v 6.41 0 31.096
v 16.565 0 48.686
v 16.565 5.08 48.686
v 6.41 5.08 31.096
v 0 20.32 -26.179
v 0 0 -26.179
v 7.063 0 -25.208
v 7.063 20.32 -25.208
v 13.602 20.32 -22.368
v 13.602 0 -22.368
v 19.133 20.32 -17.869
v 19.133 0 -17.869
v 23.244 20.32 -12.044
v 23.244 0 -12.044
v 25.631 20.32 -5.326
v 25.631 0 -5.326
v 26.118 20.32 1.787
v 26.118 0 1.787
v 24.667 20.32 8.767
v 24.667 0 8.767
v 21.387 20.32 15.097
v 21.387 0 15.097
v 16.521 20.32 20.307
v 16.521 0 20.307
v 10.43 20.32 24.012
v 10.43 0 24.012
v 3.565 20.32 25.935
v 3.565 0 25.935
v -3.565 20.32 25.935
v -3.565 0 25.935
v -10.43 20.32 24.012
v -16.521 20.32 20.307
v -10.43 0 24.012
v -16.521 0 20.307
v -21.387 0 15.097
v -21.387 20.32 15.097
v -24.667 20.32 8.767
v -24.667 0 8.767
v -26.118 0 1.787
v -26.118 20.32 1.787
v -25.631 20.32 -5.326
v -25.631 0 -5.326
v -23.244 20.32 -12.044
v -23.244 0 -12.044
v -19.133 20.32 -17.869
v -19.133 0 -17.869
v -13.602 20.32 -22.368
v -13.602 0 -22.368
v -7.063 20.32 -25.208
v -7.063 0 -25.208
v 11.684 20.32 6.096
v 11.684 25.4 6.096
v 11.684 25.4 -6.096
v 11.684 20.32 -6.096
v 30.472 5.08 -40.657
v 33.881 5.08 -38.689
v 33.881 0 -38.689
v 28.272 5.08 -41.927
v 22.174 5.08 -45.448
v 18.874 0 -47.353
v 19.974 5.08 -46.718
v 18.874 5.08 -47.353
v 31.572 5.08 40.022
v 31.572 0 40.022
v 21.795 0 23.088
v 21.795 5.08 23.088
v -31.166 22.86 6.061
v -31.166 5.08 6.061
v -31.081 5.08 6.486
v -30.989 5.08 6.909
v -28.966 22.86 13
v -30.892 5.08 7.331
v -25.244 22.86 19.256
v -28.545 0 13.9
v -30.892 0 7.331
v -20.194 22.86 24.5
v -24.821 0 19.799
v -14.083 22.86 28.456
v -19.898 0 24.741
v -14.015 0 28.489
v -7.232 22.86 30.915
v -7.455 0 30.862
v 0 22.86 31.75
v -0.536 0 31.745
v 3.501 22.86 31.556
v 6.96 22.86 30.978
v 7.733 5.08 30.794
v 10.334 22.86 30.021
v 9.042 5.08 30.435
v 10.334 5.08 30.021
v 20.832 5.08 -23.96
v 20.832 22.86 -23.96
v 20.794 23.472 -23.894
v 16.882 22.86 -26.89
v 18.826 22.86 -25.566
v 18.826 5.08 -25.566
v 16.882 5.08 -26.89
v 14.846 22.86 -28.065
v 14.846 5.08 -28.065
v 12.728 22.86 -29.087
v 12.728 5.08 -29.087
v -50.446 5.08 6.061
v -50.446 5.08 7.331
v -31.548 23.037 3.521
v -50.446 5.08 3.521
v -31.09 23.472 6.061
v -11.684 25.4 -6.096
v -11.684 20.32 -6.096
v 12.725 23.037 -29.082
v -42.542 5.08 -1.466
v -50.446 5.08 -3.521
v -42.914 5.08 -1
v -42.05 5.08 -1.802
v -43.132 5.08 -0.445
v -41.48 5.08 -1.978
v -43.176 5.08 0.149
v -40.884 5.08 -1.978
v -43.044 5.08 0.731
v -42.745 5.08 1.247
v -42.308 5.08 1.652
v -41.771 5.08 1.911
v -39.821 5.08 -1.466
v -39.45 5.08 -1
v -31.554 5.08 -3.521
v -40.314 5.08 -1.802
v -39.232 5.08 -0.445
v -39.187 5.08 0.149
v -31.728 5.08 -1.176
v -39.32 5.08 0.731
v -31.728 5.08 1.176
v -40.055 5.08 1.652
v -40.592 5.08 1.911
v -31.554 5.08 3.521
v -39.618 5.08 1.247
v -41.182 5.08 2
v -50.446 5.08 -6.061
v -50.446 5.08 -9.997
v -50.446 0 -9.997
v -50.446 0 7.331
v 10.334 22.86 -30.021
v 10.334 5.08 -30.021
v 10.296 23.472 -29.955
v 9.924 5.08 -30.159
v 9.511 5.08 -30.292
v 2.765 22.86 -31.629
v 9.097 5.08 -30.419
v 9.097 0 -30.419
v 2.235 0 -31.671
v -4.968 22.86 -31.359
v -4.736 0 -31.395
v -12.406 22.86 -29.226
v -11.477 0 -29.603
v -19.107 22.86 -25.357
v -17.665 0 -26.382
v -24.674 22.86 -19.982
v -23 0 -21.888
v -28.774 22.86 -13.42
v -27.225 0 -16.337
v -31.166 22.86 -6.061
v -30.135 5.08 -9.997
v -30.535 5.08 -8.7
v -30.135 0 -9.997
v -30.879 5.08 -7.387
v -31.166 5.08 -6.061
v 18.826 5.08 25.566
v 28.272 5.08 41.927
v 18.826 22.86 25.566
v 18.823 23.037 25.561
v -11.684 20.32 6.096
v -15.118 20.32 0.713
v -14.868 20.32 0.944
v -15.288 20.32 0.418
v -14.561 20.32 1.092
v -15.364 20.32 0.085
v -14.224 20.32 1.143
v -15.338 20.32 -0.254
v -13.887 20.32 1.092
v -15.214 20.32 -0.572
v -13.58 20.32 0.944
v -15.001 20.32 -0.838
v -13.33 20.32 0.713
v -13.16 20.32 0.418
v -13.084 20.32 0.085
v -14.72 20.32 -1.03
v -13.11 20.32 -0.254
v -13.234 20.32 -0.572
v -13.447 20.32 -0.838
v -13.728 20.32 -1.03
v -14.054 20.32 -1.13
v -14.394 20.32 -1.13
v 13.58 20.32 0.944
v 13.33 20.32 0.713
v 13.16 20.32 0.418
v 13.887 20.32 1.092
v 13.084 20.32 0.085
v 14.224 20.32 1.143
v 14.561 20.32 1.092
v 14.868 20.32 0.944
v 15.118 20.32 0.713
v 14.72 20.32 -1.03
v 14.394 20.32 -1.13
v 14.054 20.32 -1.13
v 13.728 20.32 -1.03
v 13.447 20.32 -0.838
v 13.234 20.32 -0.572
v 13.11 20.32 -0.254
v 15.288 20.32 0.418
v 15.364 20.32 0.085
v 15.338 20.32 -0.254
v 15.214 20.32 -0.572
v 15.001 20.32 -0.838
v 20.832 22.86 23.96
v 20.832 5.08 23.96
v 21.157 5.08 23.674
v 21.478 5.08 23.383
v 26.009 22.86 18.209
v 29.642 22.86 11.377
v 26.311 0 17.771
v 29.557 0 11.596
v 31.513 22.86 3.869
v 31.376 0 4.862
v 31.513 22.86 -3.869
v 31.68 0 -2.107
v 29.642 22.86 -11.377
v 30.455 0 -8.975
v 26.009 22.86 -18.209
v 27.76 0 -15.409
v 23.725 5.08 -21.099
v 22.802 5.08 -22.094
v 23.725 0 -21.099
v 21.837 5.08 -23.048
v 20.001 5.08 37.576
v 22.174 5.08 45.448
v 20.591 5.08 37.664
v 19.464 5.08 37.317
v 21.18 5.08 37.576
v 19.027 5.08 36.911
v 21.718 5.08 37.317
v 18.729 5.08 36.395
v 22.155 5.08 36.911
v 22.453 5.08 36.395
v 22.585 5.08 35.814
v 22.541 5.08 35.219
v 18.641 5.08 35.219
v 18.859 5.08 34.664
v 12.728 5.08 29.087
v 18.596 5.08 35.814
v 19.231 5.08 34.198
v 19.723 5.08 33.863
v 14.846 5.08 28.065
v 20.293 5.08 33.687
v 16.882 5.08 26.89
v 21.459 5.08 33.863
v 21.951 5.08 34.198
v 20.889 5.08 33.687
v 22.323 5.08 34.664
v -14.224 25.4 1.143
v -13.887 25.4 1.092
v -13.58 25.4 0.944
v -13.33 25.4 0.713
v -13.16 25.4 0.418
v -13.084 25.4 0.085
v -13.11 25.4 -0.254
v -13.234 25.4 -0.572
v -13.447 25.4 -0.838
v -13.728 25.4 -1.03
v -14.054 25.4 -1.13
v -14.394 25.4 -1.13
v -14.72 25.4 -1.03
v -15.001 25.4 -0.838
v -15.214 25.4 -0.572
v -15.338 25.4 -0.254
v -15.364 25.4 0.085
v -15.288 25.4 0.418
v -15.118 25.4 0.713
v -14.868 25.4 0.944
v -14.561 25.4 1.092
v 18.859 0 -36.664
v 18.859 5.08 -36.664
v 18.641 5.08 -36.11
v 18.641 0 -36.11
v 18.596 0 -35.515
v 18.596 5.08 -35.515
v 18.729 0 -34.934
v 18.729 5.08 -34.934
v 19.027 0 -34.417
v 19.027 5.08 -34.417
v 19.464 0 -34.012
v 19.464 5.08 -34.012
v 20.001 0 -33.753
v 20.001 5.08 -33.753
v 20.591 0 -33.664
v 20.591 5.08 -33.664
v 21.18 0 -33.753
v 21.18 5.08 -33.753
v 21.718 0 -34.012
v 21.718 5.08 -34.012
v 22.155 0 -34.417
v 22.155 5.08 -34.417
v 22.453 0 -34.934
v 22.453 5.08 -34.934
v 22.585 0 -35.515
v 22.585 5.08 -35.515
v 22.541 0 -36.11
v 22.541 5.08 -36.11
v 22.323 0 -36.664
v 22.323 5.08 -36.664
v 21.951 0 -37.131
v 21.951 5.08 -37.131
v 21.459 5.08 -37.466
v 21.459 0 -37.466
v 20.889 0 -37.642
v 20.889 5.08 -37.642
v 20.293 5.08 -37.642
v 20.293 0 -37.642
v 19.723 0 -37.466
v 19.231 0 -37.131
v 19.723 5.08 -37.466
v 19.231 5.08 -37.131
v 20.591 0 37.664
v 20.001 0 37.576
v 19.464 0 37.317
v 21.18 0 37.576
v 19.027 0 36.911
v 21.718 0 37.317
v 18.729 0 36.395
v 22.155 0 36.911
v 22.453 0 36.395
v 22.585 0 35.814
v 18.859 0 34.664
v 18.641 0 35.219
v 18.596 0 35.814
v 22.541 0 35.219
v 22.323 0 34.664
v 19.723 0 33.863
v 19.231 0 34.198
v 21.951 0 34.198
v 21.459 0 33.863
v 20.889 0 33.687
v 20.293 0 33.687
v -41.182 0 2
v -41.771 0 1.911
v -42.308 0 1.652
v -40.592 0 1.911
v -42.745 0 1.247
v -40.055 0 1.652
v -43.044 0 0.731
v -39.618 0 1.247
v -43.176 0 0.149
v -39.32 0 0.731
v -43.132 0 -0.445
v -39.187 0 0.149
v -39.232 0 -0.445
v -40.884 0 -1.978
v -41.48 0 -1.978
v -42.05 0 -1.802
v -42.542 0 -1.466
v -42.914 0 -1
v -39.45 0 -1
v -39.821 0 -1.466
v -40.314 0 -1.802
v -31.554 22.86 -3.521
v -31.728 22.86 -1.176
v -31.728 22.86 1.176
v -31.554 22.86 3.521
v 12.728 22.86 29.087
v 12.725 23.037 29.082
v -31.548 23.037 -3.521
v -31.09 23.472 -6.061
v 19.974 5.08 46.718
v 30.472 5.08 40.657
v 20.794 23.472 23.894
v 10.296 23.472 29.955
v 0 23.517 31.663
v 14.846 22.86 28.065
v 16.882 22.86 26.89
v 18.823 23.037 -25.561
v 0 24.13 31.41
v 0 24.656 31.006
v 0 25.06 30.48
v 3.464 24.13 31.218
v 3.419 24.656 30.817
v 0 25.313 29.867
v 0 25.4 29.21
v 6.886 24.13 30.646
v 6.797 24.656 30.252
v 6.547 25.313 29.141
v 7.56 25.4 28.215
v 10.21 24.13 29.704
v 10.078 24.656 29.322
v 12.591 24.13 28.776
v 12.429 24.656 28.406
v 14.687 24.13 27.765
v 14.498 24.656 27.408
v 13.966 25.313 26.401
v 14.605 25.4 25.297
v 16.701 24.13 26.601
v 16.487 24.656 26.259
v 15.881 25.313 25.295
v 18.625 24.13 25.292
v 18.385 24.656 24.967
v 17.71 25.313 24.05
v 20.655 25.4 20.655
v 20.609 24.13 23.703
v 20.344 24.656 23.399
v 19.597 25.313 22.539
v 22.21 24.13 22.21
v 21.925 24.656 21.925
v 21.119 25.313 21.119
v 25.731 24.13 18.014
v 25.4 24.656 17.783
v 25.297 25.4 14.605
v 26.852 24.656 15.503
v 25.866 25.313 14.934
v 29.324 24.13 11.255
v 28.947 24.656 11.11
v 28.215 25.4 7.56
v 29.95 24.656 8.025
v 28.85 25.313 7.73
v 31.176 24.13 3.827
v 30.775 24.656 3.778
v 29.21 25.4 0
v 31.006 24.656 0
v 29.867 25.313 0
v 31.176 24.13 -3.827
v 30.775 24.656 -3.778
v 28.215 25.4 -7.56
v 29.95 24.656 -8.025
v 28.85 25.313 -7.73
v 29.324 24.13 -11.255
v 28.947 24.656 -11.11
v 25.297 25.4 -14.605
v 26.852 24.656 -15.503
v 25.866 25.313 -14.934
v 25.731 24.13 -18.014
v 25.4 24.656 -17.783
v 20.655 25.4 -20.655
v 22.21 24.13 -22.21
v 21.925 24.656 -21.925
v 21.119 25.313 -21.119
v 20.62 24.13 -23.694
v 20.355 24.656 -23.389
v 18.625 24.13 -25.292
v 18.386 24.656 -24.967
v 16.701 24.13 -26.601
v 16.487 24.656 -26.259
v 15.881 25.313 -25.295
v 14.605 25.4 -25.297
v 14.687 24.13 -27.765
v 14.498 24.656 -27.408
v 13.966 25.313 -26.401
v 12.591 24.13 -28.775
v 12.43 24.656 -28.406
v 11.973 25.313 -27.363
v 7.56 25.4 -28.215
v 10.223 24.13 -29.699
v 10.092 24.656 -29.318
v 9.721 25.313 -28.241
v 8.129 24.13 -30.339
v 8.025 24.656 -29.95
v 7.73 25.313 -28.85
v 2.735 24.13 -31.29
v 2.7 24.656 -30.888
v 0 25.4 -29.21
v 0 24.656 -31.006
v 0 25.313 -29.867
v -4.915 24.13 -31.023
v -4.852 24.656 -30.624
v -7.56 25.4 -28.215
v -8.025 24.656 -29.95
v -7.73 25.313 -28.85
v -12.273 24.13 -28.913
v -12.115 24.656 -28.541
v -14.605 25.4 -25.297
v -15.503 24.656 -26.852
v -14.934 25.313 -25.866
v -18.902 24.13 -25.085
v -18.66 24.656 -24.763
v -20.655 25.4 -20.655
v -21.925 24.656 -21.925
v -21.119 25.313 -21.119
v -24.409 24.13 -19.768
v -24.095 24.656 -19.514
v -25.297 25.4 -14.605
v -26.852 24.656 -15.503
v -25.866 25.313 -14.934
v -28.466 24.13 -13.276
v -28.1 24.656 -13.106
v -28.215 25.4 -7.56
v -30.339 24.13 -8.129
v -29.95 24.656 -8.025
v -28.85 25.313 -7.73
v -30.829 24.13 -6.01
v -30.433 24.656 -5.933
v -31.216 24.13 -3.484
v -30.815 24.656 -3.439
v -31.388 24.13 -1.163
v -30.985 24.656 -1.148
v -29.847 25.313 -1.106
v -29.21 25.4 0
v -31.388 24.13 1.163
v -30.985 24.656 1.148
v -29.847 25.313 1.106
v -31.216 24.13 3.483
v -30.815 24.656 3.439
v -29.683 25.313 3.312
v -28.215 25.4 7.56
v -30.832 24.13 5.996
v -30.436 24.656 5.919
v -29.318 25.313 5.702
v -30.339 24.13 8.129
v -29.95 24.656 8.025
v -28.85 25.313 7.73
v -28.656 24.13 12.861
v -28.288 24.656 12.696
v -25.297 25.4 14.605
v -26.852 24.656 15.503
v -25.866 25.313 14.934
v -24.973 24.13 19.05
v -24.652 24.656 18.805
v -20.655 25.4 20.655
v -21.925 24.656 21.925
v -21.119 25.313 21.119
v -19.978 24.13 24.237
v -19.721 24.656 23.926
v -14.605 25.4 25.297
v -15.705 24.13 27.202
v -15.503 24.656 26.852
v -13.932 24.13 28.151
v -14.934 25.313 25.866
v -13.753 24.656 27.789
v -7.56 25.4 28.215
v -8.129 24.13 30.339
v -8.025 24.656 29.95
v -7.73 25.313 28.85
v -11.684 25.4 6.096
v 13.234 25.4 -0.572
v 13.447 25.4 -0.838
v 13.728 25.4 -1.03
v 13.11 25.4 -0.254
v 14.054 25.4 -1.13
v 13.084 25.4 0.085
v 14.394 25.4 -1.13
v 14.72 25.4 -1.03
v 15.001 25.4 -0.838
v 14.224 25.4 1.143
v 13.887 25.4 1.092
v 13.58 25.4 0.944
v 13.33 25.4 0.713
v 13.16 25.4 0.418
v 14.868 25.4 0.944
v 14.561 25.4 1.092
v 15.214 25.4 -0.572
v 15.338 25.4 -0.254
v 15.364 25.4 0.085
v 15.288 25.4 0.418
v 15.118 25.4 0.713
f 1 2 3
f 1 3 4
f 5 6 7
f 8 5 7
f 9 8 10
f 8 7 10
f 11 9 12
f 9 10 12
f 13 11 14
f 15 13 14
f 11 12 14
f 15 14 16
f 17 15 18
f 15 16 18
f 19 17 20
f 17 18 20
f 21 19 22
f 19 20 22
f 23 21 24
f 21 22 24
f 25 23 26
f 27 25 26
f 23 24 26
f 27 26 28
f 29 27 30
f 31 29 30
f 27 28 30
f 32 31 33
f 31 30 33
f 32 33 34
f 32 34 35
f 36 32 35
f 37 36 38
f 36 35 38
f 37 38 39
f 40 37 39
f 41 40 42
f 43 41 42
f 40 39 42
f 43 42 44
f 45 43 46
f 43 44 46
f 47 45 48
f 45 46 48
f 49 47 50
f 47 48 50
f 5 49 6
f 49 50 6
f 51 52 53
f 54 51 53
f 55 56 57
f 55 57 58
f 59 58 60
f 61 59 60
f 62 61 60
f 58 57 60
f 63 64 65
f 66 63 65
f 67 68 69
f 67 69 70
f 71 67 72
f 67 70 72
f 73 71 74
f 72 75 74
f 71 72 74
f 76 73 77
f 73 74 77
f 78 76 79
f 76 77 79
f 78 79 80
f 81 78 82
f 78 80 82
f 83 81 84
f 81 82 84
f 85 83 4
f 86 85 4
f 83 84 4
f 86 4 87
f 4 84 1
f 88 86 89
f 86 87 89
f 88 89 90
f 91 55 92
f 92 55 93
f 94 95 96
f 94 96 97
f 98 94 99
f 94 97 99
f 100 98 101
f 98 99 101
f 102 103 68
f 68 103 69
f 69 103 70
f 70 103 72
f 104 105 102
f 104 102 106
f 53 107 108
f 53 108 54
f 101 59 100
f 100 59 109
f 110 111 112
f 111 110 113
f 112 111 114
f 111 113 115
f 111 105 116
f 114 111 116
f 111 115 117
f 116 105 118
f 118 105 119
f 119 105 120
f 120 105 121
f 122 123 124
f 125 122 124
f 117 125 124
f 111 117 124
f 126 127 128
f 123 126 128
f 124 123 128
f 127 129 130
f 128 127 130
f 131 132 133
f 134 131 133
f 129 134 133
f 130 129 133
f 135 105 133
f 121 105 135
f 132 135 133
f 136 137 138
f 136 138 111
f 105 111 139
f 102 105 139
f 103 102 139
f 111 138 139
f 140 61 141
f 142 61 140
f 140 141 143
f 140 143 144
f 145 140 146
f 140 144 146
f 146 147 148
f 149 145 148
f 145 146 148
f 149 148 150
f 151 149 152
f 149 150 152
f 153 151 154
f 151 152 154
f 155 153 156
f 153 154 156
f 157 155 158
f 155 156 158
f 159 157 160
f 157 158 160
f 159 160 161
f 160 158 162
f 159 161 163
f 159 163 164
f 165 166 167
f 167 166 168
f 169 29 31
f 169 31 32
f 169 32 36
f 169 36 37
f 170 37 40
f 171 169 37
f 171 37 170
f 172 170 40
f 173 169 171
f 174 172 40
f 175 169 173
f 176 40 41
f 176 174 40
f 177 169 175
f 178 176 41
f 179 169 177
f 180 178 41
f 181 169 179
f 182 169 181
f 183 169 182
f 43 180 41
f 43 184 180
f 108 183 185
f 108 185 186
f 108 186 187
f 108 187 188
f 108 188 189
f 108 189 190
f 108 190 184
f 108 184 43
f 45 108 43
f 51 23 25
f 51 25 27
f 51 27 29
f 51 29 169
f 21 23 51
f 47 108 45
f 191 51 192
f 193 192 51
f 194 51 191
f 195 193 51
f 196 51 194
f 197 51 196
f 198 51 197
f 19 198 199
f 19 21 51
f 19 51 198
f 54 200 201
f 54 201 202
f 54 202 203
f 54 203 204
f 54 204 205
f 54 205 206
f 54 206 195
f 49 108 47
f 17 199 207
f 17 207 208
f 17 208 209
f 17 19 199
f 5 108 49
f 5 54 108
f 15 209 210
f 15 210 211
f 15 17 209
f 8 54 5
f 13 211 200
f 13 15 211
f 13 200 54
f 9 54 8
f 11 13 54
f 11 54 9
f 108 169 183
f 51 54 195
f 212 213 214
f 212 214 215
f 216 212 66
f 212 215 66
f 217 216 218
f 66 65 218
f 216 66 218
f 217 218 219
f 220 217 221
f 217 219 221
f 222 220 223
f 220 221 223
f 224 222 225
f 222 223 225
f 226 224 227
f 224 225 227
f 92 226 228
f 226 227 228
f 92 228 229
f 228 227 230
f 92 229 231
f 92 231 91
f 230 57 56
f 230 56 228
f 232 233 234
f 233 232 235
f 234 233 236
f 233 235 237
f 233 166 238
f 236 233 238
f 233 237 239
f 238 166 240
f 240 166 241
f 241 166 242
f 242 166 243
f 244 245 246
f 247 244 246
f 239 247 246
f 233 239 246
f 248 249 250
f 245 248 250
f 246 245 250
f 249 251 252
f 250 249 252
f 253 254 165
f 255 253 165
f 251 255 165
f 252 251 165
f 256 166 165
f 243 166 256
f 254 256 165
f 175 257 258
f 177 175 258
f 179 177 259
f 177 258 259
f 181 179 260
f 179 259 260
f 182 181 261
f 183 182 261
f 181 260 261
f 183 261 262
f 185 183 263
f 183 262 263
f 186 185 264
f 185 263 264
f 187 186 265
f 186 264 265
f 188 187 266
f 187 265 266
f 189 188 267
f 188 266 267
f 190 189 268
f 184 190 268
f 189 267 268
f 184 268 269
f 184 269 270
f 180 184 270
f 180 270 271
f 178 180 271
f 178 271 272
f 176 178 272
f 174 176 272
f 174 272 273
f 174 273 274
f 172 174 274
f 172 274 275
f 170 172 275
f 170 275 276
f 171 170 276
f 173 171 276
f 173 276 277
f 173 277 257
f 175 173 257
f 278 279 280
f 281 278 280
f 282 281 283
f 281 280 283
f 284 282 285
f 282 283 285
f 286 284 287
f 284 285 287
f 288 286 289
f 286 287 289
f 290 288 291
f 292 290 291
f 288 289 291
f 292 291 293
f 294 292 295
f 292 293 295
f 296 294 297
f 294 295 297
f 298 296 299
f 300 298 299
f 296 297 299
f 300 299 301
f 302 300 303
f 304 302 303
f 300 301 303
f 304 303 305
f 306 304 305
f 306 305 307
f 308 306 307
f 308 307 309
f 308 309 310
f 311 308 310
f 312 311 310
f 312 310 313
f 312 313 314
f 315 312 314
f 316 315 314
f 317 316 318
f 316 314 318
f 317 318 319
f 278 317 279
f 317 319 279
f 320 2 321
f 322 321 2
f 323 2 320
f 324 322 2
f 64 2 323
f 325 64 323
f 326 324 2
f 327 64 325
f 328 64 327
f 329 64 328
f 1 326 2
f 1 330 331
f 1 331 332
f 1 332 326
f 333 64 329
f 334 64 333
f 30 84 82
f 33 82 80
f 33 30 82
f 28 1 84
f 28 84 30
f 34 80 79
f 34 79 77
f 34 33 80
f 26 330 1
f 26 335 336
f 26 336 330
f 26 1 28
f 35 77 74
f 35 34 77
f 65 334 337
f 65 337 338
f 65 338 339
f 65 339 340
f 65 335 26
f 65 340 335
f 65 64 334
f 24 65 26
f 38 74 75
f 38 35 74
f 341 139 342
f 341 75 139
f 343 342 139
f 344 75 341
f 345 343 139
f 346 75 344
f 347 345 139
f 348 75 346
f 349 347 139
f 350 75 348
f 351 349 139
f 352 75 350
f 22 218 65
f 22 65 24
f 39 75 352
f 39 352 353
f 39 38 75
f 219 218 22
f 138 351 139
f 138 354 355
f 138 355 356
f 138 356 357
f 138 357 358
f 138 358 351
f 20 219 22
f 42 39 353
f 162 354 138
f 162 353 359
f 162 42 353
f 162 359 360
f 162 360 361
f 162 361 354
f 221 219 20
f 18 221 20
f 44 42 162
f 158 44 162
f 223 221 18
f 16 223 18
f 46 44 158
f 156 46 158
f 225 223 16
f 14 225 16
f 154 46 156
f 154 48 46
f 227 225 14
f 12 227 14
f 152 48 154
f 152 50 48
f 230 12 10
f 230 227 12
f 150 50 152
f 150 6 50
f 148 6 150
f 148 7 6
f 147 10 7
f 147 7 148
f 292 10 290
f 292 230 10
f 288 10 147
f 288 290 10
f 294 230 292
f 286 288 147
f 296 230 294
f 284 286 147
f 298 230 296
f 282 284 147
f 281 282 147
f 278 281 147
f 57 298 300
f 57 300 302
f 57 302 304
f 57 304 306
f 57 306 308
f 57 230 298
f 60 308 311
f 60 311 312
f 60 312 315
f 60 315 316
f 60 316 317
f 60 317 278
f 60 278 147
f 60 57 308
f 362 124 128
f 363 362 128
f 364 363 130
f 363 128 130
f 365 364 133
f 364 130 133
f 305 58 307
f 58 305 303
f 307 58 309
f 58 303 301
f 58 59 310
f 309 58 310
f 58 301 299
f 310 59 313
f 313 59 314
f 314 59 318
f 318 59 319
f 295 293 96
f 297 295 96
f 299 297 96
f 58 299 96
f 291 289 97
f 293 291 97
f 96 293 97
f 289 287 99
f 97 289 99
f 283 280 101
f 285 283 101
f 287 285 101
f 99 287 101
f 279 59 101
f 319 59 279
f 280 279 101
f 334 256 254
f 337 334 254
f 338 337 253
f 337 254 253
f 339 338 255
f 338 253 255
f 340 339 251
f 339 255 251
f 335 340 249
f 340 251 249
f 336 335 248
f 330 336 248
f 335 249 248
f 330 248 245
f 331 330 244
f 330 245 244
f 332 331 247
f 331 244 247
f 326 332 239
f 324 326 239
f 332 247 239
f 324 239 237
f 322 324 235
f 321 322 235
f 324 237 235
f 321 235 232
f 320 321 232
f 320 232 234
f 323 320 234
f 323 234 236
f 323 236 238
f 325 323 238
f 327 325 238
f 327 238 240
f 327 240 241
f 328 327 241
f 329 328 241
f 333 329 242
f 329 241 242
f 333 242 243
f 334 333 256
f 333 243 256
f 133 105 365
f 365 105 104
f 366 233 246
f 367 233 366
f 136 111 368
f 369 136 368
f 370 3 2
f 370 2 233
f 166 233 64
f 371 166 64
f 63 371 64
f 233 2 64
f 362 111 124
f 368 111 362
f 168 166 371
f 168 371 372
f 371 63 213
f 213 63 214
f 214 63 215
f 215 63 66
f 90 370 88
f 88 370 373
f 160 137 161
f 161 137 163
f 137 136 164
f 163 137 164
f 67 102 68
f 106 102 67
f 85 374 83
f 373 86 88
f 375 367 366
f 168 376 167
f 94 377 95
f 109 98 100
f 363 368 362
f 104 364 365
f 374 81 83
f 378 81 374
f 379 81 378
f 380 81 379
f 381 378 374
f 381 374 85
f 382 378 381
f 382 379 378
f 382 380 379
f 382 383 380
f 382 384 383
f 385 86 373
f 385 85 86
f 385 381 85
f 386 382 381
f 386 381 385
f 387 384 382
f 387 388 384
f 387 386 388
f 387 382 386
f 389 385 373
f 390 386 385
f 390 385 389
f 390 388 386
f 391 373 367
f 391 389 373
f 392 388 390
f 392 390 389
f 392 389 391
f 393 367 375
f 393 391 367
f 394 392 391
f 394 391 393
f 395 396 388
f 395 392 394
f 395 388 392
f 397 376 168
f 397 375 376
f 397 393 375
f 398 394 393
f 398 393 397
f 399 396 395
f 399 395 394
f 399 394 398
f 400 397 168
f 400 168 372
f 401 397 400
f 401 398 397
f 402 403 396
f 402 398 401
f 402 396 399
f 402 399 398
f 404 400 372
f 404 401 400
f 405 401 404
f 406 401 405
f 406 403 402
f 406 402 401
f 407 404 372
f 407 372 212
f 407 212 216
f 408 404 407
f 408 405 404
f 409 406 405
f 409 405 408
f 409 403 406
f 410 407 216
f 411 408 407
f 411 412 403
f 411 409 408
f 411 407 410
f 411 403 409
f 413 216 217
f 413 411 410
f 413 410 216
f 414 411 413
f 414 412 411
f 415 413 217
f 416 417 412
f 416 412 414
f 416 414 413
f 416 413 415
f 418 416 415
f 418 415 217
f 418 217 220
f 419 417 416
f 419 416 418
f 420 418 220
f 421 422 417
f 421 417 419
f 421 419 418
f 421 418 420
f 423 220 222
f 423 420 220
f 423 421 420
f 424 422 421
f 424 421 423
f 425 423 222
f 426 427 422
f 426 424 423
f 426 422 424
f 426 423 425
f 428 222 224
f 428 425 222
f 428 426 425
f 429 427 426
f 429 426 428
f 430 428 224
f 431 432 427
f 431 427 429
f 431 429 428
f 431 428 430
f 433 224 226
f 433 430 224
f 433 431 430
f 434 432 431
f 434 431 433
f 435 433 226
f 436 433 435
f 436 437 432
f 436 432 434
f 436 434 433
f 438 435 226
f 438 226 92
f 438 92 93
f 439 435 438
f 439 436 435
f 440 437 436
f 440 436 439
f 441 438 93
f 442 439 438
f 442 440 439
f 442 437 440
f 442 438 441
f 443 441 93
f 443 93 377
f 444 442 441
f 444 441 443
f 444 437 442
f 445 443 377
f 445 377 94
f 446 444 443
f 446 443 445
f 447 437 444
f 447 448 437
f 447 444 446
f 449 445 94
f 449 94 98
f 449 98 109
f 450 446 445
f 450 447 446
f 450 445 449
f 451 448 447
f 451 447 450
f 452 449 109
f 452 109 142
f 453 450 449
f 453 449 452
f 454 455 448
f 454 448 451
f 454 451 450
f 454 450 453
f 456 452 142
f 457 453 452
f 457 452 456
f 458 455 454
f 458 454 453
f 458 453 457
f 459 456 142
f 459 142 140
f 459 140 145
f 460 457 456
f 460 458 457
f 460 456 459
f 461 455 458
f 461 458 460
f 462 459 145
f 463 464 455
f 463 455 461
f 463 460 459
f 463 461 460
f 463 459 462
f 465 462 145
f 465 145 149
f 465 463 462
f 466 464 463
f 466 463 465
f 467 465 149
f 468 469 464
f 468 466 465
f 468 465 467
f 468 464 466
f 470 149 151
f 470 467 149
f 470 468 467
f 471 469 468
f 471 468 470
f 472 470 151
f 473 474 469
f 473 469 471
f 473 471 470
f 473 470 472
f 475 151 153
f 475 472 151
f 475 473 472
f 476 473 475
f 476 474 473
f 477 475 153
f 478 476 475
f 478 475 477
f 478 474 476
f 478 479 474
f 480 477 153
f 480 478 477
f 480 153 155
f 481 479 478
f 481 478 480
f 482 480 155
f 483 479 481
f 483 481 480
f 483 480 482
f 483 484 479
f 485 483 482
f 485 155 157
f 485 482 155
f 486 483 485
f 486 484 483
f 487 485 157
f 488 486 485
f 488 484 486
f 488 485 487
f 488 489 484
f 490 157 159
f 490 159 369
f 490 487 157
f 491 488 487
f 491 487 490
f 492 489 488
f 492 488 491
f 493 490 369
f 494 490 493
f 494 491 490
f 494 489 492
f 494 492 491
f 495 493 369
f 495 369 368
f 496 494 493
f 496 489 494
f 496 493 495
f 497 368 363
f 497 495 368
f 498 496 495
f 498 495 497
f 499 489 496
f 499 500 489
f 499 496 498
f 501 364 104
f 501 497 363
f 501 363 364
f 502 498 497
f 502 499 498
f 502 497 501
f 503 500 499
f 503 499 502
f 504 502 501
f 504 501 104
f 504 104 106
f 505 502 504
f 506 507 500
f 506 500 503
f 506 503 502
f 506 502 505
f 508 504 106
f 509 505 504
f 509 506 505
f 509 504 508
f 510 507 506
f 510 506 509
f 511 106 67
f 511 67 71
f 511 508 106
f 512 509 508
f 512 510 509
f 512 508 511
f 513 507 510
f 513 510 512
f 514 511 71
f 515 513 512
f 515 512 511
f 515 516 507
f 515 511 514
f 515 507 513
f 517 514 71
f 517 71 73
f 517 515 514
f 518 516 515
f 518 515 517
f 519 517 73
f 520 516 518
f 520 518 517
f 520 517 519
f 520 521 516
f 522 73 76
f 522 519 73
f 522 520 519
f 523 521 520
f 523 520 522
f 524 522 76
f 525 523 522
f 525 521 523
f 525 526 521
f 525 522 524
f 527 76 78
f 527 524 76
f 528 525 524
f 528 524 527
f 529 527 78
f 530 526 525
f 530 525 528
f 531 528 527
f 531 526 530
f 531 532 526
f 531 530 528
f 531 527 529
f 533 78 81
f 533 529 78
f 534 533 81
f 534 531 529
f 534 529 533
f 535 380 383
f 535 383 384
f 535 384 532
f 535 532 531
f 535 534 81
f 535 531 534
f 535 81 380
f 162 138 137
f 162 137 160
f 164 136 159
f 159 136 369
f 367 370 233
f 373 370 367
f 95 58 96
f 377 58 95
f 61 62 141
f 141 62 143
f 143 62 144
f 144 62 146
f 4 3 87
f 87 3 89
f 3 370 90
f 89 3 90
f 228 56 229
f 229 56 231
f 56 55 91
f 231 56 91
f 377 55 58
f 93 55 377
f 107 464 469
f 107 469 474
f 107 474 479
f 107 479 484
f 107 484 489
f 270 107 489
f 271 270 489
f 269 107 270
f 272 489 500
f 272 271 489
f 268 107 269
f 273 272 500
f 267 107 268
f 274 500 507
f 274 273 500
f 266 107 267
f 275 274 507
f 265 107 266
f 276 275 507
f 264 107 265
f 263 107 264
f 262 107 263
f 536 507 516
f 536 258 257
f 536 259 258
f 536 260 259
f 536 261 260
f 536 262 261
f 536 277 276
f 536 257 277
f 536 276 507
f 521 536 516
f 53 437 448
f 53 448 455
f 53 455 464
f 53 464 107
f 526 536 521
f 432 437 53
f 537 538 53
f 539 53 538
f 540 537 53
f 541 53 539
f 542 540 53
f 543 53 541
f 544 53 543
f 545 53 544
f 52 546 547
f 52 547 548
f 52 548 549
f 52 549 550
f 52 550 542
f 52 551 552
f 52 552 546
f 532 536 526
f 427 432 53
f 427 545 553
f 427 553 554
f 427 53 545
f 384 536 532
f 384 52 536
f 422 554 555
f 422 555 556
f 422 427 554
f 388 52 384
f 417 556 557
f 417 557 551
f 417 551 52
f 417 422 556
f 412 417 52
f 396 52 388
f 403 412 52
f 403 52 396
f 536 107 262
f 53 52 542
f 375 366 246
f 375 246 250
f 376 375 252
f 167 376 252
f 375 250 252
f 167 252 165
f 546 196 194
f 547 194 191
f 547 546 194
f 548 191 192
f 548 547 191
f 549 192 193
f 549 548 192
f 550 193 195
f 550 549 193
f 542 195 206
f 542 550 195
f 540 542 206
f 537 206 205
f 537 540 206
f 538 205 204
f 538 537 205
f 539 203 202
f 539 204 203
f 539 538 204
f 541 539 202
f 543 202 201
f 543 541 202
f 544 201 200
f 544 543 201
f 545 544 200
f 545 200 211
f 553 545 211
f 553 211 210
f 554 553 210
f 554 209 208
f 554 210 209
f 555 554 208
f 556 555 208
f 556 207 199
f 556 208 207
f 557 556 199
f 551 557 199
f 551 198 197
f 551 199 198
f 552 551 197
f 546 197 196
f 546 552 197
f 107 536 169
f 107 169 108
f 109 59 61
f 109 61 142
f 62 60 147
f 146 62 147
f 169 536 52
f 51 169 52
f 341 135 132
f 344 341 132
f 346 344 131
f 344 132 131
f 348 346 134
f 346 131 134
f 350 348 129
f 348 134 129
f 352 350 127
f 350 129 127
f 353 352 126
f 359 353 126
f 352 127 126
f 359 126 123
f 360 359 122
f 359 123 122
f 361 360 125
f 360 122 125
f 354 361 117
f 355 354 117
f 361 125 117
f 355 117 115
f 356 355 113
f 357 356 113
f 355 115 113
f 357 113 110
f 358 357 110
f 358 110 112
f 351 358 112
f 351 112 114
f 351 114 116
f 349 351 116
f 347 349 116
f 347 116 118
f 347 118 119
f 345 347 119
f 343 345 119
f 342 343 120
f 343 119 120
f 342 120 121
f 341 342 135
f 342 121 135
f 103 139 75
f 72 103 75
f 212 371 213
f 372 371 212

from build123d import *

# Parameters (mm, degrees)
SKETCH1_R                   = 31.75
BOSS_EXTRUDE1_DEPTH         = 25.4
FILLET1_R                   = 2.54
SKETCH2_R                   = 26.178994306
CUT_EXTRUDE1_DEPTH          = 20.32
SKETCH3_W                   = 23.368
SKETCH3_H                   = 12.192
CUT_EXTRUDE2_DEPTH          = 20.32
SKETCH4_R                   = 1.143
CUT_EXTRUDE3_DEPTH          = 20.32
SKETCH6_W                   = 22.454622086
SKETCH6_H                   = 17.327996038
BOSS_EXTRUDE2_DEPTH         = 5.08
RIB1_REACH                  = 69.27
SKETCH11_WALL_W             = 162.351686776
SKETCH11_WALL_H             = 2.54
CIRPATTERN1_COUNT           = 3
CIRPATTERN1_COPY_1_REACH    = 69.27
CIRPATTERN1_COPY_1_SKETCH_W = 162.351686776
CIRPATTERN1_COPY_1_SKETCH_H = 2.54
CIRPATTERN1_COPY_2_REACH    = 69.27
CIRPATTERN1_COPY_2_SKETCH_W = 162.351686776
CIRPATTERN1_COPY_2_SKETCH_H = 2.54
SKETCH12_R                  = 2
CUT_EXTRUDE4_DEPTH          = 5.08
CIRPATTERN2_COUNT           = 3


with BuildPart() as part:
    # Sketch1 → Boss-Extrude1 (new body)
    with BuildSketch(Plane(origin=(0, 0, 0), x_dir=(1, 0, 0), z_dir=(0, 1, 0))):
        with Locations(Location((0, 0, 0), (0, 0, 270))):
            Circle(SKETCH1_R)
    extrude(amount=BOSS_EXTRUDE1_DEPTH)

    # Fillet1
    fillet1_edges = [part.edges().sort_by_distance(p)[0] for p in [
        (0, 25.4, -31.75),
    ]]
    fillet(fillet1_edges, radius=FILLET1_R)

    # Sketch2 → Cut-Extrude1 (cut)
    with BuildSketch(Plane.XZ):
        with Locations(Location((0, 0, 0), (0, 0, 270))):
            Circle(SKETCH2_R)
    extrude(amount=-CUT_EXTRUDE1_DEPTH, mode=Mode.SUBTRACT)

    # Sketch3 → Cut-Extrude2 (cut)
    with BuildSketch(Plane(origin=(0, 25.4, 0), x_dir=(1, 0, 0), z_dir=(0, 1, 0))):
        Rectangle(SKETCH3_W, SKETCH3_H)
    extrude(amount=-CUT_EXTRUDE2_DEPTH, mode=Mode.SUBTRACT)

    # Sketch4 → Cut-Extrude3 (cut)
    with BuildSketch(Plane(origin=(0, 25.4, 0), x_dir=(1, 0, 0), z_dir=(0, 1, 0))):
        with Locations(Location((-14.224, 0, 0), (0, 0, 270))):
            Circle(SKETCH4_R)
    cut_extrude3 = extrude(amount=-CUT_EXTRUDE3_DEPTH, mode=Mode.SUBTRACT)

    # Mirror1: Cut-Extrude3 across plane
    add(cut_extrude3.mirror(Plane(origin=(0, 0, 0), x_dir=(0, 0, 1), z_dir=(1, 0, 0))), mode=Mode.SUBTRACT)

    # Sketch6 → Boss-Extrude2 (add)
    with BuildSketch(Plane.XZ):
        with Locations((-39.218689259, -1.332922772)):
            Rectangle(SKETCH6_W, SKETCH6_H)
    boss_extrude2 = extrude(amount=-BOSS_EXTRUDE2_DEPTH)

    # Sketch11 wall → Rib1 (add, up to next)
    with BuildSketch(Plane(origin=(-41.089874413, 13.97, 4.791075247), x_dir=(0.724934415066, 0.688817896002, 0), z_dir=(-0.688817896002, 0.724934415066, 0)), mode=Mode.PRIVATE) as rib1_sk1:
        Rectangle(SKETCH11_WALL_W, SKETCH11_WALL_H)
    rib1_tool1 = extrude(rib1_sk1.sketch, amount=-RIB1_REACH, mode=Mode.PRIVATE) - part.part
    rib1 = rib1_tool1.solids().sort_by_distance((-41.089874413, 13.97, 4.791075247))[0]
    add(rib1)

    # Mirror2: Rib1 across plane
    add(rib1.mirror(Plane.XY))

    # CirPattern1: Boss-Extrude2, Rib1 ×3 about axis
    cirpattern1_axis = Axis((0, 0, 0), (0, 1, 0))
    add([boss_extrude2.rotate(cirpattern1_axis, i * 360 / CIRPATTERN1_COUNT) for i in range(1, CIRPATTERN1_COUNT)])
    add([rib1.rotate(cirpattern1_axis, i * 360 / CIRPATTERN1_COUNT) for i in range(1, CIRPATTERN1_COUNT)])

    # CirPattern1 copy 1 sketch → CirPattern1 copy 1 (add, up to next)
    with BuildSketch(Plane(origin=(16.395744331, 13.97, 37.980412703), x_dir=(-0.3624672075329998, 0.688817896002, -0.6278116195247685), z_dir=(0.34440894800099986, 0.724934415066, 0.5965337965190796)), mode=Mode.PRIVATE) as cirpattern1_copy_1_sk1:
        Rectangle(CIRPATTERN1_COPY_1_SKETCH_W, CIRPATTERN1_COPY_1_SKETCH_H)
    cirpattern1_copy_1_tool1 = extrude(cirpattern1_copy_1_sk1.sketch, amount=-CIRPATTERN1_COPY_1_REACH, mode=Mode.PRIVATE) - part.part
    add(cirpattern1_copy_1_tool1.solids().sort_by_distance((16.395744331, 13.97, 37.980412703))[0])

    # CirPattern1 copy 2 sketch → CirPattern1 copy 2 (add, up to next)
    with BuildSketch(Plane(origin=(24.694130082, 13.97, -33.189337456), x_dir=(-0.3624672075330003, 0.688817896002, 0.6278116195247683), z_dir=(0.34440894800100036, 0.724934415066, -0.5965337965190793)), mode=Mode.PRIVATE) as cirpattern1_copy_2_sk1:
        Rectangle(CIRPATTERN1_COPY_2_SKETCH_W, CIRPATTERN1_COPY_2_SKETCH_H)
    cirpattern1_copy_2_tool1 = extrude(cirpattern1_copy_2_sk1.sketch, amount=-CIRPATTERN1_COPY_2_REACH, mode=Mode.PRIVATE) - part.part
    add(cirpattern1_copy_2_tool1.solids().sort_by_distance((24.694130082, 13.97, -33.189337456))[0])

    # Sketch12 → Cut-Extrude4 (cut)
    with BuildSketch(Plane(origin=(0, 5.08, 0), x_dir=(1, 0, 0), z_dir=(0, 1, 0))):
        with Locations(Location((-41.1817754, 0, 0), (0, 0, 270))):
            Circle(SKETCH12_R)
    cut_extrude4 = extrude(amount=-CUT_EXTRUDE4_DEPTH, mode=Mode.SUBTRACT)

    # CirPattern2: Cut-Extrude4 ×3 about axis
    cirpattern2_axis = Axis((0, 0, 0), (0, 1, 0))
    for i in range(1, CIRPATTERN2_COUNT):
        add(cut_extrude4.rotate(cirpattern2_axis, i * 360 / CIRPATTERN2_COUNT), mode=Mode.SUBTRACT)


solid = part.part
